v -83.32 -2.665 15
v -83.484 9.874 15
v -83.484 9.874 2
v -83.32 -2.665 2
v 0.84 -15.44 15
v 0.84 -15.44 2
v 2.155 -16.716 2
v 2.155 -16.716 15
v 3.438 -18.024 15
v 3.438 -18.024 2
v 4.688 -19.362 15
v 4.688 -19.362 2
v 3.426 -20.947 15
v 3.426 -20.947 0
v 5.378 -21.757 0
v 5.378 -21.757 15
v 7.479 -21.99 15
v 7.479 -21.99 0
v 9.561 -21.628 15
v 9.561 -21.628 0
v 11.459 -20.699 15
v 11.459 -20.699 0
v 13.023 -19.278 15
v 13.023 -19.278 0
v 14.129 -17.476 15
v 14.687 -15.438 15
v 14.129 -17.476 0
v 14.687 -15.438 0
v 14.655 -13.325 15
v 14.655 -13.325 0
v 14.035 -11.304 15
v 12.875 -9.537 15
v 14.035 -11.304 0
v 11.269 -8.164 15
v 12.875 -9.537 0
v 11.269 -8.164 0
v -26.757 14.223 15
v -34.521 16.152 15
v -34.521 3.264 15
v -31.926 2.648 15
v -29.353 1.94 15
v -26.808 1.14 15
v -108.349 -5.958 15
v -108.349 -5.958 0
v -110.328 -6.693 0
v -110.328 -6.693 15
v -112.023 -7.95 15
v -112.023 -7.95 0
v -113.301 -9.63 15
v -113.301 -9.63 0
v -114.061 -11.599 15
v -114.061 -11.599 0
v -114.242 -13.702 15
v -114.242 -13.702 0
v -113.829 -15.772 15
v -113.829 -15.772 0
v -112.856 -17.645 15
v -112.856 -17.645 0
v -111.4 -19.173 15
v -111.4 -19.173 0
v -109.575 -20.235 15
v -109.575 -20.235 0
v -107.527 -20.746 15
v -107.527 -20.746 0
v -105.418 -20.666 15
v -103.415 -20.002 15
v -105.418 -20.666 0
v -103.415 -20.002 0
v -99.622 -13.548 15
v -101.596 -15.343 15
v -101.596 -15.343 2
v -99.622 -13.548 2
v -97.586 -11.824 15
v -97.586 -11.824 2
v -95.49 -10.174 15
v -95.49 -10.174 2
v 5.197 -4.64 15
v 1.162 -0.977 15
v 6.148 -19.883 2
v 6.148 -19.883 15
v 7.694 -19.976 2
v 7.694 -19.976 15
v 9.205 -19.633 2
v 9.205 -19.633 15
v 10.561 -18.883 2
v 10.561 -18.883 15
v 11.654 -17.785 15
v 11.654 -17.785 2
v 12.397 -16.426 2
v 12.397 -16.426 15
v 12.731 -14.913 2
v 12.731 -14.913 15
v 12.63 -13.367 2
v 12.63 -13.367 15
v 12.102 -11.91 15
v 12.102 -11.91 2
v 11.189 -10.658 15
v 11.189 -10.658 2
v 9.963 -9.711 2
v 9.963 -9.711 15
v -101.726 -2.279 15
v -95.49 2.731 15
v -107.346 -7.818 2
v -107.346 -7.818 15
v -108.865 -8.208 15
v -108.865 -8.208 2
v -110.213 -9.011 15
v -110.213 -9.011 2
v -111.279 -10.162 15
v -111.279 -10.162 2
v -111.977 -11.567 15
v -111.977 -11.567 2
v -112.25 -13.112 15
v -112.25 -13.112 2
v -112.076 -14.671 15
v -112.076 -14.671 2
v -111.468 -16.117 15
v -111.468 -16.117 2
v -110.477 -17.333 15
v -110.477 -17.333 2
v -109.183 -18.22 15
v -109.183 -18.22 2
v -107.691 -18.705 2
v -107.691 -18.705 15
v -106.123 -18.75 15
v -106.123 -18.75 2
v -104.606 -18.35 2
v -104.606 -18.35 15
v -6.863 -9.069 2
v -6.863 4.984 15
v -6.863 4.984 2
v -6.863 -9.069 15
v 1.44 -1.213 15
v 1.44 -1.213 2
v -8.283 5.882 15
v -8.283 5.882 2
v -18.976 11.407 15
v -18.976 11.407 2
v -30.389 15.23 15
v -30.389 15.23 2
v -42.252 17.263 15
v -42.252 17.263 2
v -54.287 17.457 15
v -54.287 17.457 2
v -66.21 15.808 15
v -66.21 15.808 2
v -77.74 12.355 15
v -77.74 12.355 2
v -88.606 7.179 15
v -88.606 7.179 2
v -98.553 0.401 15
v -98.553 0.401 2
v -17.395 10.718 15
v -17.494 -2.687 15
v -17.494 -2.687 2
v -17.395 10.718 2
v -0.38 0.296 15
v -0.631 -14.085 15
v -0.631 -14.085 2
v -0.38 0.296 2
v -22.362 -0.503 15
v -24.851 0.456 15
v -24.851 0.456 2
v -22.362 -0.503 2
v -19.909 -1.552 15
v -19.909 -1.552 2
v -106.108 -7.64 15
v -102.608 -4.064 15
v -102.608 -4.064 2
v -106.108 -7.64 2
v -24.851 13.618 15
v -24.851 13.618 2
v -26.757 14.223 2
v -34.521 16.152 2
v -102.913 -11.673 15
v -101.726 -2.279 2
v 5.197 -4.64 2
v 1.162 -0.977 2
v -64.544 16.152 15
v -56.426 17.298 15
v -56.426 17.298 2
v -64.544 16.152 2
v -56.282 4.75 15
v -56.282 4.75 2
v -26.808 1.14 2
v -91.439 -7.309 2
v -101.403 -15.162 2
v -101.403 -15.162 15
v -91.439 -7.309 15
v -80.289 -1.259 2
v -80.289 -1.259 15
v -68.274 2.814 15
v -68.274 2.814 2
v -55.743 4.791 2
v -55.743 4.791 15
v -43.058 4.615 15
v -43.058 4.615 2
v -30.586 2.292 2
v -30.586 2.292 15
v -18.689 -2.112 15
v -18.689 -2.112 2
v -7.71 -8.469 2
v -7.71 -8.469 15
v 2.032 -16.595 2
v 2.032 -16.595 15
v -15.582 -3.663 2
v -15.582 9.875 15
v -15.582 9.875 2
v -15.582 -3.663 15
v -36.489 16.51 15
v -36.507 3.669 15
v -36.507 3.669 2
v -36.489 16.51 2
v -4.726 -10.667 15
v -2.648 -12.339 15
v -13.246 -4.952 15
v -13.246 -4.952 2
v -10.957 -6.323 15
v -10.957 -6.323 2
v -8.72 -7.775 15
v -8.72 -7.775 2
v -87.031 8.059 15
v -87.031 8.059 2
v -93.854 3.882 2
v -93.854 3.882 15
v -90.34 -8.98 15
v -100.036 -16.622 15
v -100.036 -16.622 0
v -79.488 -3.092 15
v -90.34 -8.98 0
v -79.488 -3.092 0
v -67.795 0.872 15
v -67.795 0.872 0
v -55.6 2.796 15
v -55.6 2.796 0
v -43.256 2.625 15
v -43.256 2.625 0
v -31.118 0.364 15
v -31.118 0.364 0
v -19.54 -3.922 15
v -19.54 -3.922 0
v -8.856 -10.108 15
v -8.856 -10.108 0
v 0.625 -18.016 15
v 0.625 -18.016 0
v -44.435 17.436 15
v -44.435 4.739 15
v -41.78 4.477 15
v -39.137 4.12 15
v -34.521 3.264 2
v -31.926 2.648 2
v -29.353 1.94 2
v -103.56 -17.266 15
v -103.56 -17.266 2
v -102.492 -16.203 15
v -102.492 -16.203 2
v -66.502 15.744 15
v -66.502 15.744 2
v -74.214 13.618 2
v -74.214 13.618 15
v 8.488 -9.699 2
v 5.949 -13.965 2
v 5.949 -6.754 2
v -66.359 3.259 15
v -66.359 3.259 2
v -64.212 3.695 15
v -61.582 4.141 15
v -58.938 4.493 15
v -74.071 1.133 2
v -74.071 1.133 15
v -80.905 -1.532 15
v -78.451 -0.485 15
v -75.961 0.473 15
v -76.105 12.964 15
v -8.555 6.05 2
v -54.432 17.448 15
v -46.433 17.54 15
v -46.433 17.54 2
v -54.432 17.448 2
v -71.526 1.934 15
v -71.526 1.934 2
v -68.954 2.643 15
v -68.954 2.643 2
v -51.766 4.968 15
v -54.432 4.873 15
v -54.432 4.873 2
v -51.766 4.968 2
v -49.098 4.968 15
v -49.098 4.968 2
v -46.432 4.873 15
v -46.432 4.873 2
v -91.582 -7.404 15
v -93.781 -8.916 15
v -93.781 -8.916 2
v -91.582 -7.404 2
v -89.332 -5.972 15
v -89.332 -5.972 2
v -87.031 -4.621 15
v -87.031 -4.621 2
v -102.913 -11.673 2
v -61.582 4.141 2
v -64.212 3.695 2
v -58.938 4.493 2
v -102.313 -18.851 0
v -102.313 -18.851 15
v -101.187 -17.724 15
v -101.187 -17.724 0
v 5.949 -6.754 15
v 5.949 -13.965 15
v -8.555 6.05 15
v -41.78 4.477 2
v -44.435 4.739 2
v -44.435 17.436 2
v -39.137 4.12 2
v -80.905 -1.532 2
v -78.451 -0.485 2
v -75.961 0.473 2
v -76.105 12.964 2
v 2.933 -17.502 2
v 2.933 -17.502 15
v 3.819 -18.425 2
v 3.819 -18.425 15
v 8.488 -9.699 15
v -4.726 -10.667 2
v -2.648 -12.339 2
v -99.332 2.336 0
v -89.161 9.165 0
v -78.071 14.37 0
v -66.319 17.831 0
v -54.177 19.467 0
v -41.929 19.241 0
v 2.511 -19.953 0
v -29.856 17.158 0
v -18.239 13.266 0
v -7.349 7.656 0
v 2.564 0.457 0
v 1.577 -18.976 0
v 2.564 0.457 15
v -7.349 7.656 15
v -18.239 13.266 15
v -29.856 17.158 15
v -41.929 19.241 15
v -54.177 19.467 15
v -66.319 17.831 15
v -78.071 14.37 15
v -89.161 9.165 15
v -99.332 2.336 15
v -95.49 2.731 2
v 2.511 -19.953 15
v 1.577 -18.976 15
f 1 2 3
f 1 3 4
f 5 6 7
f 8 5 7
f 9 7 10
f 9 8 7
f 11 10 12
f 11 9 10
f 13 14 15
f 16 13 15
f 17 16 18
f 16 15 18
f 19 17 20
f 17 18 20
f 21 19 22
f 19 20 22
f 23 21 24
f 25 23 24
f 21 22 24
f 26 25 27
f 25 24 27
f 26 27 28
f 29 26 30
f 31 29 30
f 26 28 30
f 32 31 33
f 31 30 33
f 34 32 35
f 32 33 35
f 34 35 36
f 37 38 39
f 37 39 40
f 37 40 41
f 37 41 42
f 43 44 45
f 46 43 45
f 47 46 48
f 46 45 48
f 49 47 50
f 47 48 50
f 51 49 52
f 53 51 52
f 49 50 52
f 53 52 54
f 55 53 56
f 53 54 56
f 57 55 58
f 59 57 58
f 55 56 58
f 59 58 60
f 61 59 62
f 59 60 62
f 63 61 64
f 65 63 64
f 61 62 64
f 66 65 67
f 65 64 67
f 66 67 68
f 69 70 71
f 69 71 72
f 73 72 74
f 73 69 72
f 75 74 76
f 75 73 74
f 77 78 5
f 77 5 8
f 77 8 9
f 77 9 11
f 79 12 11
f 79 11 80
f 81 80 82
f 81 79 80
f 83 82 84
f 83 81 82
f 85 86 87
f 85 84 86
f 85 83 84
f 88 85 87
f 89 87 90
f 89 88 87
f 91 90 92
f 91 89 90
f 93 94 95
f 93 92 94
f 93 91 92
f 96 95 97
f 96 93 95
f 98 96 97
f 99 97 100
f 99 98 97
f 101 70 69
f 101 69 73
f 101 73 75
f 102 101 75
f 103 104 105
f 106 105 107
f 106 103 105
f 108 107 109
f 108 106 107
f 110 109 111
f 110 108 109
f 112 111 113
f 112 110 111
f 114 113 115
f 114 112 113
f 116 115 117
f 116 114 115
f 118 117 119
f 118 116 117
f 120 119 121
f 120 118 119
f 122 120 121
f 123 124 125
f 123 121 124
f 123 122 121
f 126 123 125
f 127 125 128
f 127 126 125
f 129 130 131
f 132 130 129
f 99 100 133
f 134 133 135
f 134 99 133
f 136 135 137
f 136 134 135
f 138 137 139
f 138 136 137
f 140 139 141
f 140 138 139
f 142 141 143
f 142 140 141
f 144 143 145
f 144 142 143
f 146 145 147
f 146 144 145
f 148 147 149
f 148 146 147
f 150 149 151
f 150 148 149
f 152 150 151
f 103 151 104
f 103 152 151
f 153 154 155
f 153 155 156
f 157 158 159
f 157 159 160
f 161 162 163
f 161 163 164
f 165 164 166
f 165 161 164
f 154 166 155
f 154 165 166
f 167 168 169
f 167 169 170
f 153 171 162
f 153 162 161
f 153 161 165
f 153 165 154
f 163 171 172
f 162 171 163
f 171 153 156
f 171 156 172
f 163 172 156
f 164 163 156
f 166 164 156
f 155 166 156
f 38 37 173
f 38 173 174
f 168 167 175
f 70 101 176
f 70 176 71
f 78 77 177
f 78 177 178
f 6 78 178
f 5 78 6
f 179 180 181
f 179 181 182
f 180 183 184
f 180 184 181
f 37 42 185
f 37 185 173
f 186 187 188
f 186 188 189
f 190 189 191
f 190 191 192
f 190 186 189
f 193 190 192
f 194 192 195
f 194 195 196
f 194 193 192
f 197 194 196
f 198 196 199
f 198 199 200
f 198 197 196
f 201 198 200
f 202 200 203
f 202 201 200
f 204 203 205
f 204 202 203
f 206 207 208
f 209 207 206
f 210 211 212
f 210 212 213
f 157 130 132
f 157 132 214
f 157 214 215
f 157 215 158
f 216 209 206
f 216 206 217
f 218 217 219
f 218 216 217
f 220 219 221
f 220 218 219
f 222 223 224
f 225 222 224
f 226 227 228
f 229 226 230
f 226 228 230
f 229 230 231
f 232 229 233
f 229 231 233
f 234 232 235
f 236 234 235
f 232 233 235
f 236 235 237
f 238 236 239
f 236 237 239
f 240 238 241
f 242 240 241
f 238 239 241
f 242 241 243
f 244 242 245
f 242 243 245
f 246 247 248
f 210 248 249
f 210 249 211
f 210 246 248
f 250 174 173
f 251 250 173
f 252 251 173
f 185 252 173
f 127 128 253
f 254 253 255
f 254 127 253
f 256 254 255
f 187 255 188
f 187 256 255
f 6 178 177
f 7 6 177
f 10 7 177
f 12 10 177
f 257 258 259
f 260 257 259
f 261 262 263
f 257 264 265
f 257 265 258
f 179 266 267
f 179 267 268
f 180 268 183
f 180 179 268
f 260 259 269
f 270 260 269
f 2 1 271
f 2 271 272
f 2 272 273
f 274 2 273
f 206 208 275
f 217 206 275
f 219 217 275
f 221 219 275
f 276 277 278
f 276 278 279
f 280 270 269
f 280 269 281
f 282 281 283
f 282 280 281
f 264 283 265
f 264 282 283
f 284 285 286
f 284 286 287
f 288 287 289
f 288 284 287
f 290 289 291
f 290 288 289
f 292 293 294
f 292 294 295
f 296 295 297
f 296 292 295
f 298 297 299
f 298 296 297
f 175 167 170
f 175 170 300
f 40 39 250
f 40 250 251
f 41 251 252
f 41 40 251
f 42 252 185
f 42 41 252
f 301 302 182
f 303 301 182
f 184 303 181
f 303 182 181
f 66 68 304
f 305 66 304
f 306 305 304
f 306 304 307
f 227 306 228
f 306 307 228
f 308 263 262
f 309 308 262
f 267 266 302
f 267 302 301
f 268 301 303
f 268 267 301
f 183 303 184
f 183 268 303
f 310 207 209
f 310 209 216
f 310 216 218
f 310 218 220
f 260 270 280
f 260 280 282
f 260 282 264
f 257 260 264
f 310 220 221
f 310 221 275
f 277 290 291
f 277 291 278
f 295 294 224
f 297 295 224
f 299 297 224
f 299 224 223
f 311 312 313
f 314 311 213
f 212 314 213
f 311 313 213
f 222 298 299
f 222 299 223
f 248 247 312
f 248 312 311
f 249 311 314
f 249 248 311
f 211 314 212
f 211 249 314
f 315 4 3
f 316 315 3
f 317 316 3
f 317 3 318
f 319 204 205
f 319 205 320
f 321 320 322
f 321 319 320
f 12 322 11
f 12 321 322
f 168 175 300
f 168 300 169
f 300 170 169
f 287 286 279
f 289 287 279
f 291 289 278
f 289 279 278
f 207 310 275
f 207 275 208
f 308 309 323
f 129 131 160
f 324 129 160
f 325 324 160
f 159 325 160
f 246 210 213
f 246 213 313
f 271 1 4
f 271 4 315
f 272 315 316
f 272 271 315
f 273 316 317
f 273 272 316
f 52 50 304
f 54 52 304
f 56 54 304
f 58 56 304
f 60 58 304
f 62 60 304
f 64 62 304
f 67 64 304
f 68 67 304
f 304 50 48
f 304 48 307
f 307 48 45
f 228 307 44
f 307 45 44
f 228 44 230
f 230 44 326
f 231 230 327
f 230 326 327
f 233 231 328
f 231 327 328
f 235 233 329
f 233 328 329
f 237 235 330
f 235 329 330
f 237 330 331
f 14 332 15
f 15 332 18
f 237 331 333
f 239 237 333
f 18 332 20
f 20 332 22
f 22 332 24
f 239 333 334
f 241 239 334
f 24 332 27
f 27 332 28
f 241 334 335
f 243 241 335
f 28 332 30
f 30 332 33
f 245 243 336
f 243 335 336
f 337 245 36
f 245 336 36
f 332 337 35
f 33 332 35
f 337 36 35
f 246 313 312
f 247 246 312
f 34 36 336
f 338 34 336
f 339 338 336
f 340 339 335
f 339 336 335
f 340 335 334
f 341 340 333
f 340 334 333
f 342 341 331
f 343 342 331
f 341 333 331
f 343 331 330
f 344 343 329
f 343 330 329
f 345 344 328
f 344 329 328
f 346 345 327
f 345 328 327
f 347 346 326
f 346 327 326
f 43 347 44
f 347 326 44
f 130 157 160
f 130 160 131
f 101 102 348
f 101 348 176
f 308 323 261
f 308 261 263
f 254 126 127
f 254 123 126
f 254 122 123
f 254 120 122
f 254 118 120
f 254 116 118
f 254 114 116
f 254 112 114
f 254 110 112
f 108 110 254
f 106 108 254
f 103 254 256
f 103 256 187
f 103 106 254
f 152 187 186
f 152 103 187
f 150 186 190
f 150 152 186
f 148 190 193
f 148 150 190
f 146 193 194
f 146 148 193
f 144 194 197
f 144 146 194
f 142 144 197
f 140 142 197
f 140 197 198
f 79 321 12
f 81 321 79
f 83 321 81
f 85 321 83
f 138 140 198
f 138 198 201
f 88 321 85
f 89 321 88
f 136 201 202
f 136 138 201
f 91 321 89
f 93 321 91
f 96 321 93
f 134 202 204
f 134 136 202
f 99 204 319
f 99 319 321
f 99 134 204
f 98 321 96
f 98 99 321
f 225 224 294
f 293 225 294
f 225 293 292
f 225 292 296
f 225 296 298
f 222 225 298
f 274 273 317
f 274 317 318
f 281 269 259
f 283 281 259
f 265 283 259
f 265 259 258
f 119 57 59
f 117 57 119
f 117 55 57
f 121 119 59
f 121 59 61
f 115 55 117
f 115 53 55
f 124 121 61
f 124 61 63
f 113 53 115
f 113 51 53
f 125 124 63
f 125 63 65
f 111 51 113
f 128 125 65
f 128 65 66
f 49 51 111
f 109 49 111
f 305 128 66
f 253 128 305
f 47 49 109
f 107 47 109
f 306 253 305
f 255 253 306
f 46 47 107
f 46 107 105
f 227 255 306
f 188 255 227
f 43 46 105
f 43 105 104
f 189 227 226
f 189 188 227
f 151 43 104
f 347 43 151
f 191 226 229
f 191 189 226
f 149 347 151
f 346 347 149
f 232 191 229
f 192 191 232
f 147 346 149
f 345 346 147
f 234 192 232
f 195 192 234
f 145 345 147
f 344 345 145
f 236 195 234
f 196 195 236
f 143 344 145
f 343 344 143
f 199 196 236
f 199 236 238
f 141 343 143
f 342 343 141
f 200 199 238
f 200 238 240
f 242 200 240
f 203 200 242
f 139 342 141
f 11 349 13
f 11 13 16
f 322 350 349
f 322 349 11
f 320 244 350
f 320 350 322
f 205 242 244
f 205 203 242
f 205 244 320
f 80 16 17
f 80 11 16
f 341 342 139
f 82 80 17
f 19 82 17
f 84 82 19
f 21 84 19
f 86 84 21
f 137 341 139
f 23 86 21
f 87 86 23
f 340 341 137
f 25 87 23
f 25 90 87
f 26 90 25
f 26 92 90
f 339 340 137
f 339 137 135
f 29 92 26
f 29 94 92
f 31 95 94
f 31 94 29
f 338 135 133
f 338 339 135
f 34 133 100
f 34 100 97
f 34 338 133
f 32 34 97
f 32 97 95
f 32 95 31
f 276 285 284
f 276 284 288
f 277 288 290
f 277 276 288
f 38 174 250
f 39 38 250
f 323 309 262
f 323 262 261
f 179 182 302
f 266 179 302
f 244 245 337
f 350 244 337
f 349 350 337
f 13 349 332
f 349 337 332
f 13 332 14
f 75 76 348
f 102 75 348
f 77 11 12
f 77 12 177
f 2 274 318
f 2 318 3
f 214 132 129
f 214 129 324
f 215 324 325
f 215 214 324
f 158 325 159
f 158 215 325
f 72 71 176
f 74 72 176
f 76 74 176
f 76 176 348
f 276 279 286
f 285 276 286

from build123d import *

# Parameters (mm, degrees)
F1_DEPTH = 15
F2_T     = -2
F4_DEPTH = 13


with BuildPart() as f1:
    # F0 (on Top) → F1 (new body)
    with BuildSketch(Plane.XY):
        with BuildLine():
            ThreePointArc((-103.4145893394, -20.0020372304), (-101.7530636303, -18.2842545923), (-100.0358769395, -16.622112979))
            ThreePointArc((-100.0358769395, -16.622112979), (-100.8380156497, -8.6749521659), (-108.3492203393, -5.9578589379))
            ThreePointArc((-108.3492203393, -5.9578589379), (-113.8289881657, -15.7722740518), (-103.4145893394, -20.0020372304))
        make_face()
        with BuildLine():
            ThreePointArc((-108.3492203393, -5.9578589379), (-100.8380156497, -8.6749521659), (-100.0358769395, -16.622112979))
            ThreePointArc((-100.0358769395, -16.622112979), (-49.4242809896, 2.9732946618), (0.62536283, -18.0159120585))
            ThreePointArc((0.62536283, -18.0159120585), (2.1522005977, -8.98989439), (11.2690780996, -8.1635935155))
            ThreePointArc((11.2690780996, -8.1635935155), (-48.0486807446, 19.5876661754), (-108.3492203393, -5.9578589379))
        make_face()
        with BuildLine():
            ThreePointArc((11.2690780996, -8.1635935155), (2.1522005977, -8.98989439), (0.62536283, -18.0159120585))
            ThreePointArc((0.62536283, -18.0159120585), (2.0460375935, -19.4621178326), (3.4257617252, -20.9474424588))
            ThreePointArc((3.4257617252, -20.9474424588), (13.6396472431, -18.4160086635), (11.2690780996, -8.1635935155))
        make_face()
    extrude(amount=F1_DEPTH)

    # F2
    f2_openings = [f1.faces().sort_by_distance(p)[0] for p in [
        (-49.774898, 4.332759, 15),
    ]]
    offset(amount=F2_T, openings=f2_openings, kind=Kind.INTERSECTION)


with BuildPart() as f4:
    # F3 (on face) → F4 (new body, through all)
    with BuildSketch(Plane.XY.offset(15)):
        with BuildLine():
            Line((-95.4898901075, -10.1742005895), (-95.4898901075, 2.7314309094))
            Line((-95.4898901075, 2.7314309094), (-101.7262580431, -2.2793290103))
            Line((-101.7262580431, -2.2793290103), (-101.5956101166, -15.3433575005))
            ThreePointArc((-101.5956101166, -15.3433575005), (-98.6121194375, -12.6768411805), (-95.4898901075, -10.1742005895))
        make_face()
    extrude(amount=-F4_DEPTH)


with BuildPart() as f4b:
    # F3 (on face) → F4, piece 2 (new body, through all)
    with BuildSketch(Plane.XY.offset(15)):
        with BuildLine():
            Line((-87.0312413723, -4.6207937288), (-87.0312413723, 8.0593059238))
            Line((-87.0312413723, 8.0593059238), (-93.8541566424, 3.882246286))
            Line((-93.8541566424, 3.882246286), (-93.7805583698, -8.9157582301))
            ThreePointArc((-93.7805583698, -8.9157582301), (-90.463537663, -6.677701138), (-87.0312413723, -4.6207937288))
        make_face()
    extrude(amount=-F4_DEPTH)


with BuildPart() as f4c:
    # F3 (on face) → F4, piece 3 (new body, through all)
    with BuildSketch(Plane.XY.offset(15)):
        with BuildLine():
            Line((-75.9613002437, 0.4730007029), (-76.1046711734, 12.9642358404))
            Line((-76.1046711734, 12.9642358404), (-83.4838928856, 9.8743997731))
            Line((-83.4838928856, 9.8743997731), (-83.3200044003, -2.6653863247))
            ThreePointArc((-83.3200044003, -2.6653863247), (-79.6827690143, -0.9974400834), (-75.9613002437, 0.4730007029))
        make_face()
    extrude(amount=-F4_DEPTH)


with BuildPart() as f4d:
    # F3 (on face) → F4, piece 4 (new body, through all)
    with BuildSketch(Plane.XY.offset(15)):
        with BuildLine():
            Line((-66.3586949755, 3.258935501), (-66.5021755213, 15.7439962339))
            Line((-66.5021755213, 15.7439962339), (-74.2144002054, 13.6175930684))
            Line((-74.2144002054, 13.6175930684), (-74.0711079848, 1.1332154879))
            ThreePointArc((-74.0711079848, 1.1332154879), (-70.24342833, 2.2995749427), (-66.3586949755, 3.258935501))
        make_face()
    extrude(amount=-F4_DEPTH)


with BuildPart() as f4e:
    # F3 (on face) → F4, piece 5 (new body, through all)
    with BuildSketch(Plane.XY.offset(15)):
        with BuildLine():
            Line((-56.2822685579, 4.7501755422), (-56.4264683123, 17.2978187198))
            Line((-56.4264683123, 17.2978187198), (-64.5441680089, 16.1516806479))
            Line((-64.5441680089, 16.1516806479), (-64.2124202231, 3.6953321573))
            ThreePointArc((-64.2124202231, 3.6953321573), (-60.2615002336, 4.3291753187), (-56.2822685579, 4.7501755422))
        make_face()
    extrude(amount=-F4_DEPTH)


with BuildPart() as f4f:
    # F3 (on face) → F4, piece 6 (new body, through all)
    with BuildSketch(Plane.XY.offset(15)):
        with BuildLine():
            Line((-46.4326556534, 17.5400977585), (-54.4321274251, 17.4481664014))
            Line((-54.4321274251, 17.4481664014), (-54.4321274251, 4.8727246799))
            ThreePointArc((-54.4321274251, 4.8727246799), (-50.4321319055, 4.980250305), (-46.432127432, 4.8730582835))
            Line((-46.432127432, 4.8730582835), (-46.4326556534, 17.5400977585))
        make_face()
    extrude(amount=-F4_DEPTH)


with BuildPart() as f4g:
    # F3 (on face) → F4, piece 7 (new body, through all)
    with BuildSketch(Plane.XY.offset(15)):
        with BuildLine():
            Line((-36.4891635139, 16.5095859122), (-44.435386294, 17.4356223741))
            Line((-44.435386294, 17.4356223741), (-44.435386294, 4.7389883998))
            ThreePointArc((-44.435386294, 4.7389883999), (-40.4569568247, 4.3104736687), (-36.5072409706, 3.6691698492))
            Line((-36.5072409706, 3.6691698492), (-36.4891635139, 16.5095859122))
        make_face()
    extrude(amount=-F4_DEPTH)


with BuildPart() as f4h:
    # F3 (on face) → F4, piece 8 (new body, through all)
    with BuildSketch(Plane.XY.offset(15)):
        with BuildLine():
            Line((-26.7574328685, 14.223014409), (-34.5213930336, 16.1519837075))
            Line((-34.5213930336, 16.1519837075), (-34.5213930336, 3.2637521859))
            ThreePointArc((-34.5213930336, 3.2637521859), (-30.6363695723, 2.3055671189), (-26.8083371744, 1.1403659015))
            Line((-26.8083371744, 1.1403659014), (-26.7574328685, 14.223014409))
        make_face()
    extrude(amount=-F4_DEPTH)


with BuildPart() as f4i:
    # F3 (on face) → F4, piece 9 (new body, through all)
    with BuildSketch(Plane.XY.offset(15)):
        with BuildLine():
            Line((-17.3954665655, 10.7175076645), (-24.8511096793, 13.6180913574))
            Line((-24.8511096793, 13.6180913574), (-24.8511096793, 0.4563537047))
            ThreePointArc((-24.8511096793, 0.4563537047), (-21.1305995668, -1.0165109937), (-17.4944514793, -2.6868262342))
            Line((-17.4944514793, -2.6868262343), (-17.3954665655, 10.7175076645))
        make_face()
    extrude(amount=-F4_DEPTH)


with BuildPart() as f4j:
    # F3 (on face) → F4, piece 10 (new body, through all)
    with BuildSketch(Plane.XY.offset(15)):
        with BuildLine():
            Line((-8.5552640176, 6.0499805347), (-15.581541431, 9.8750852013))
            Line((-15.581541431, 9.8750852013), (-15.581541431, -3.6629684785))
            ThreePointArc((-15.581541431, -3.6629684785), (-12.0953403549, -5.6271293615), (-8.7195174744, -7.775464949))
            Line((-8.7195174744, -7.775464949), (-8.5552640176, 6.0499805347))
        make_face()
    extrude(amount=-F4_DEPTH)


with BuildPart() as f4k:
    # F3 (on face) → F4, piece 11 (new body, through all)
    with BuildSketch(Plane.XY.offset(15)):
        with BuildLine():
            Line((-0.3803533632, 0.2962142563), (-6.863187541, 4.9837360987))
            Line((-6.863187541, 4.9837360987), (-6.863187541, -9.0694472612))
            ThreePointArc((-6.863187541, -9.0694472612), (-3.6795459884, -11.4934836433), (-0.6305151118, -14.08480312))
            Line((-0.6305151118, -14.08480312), (-0.3803533632, 0.2962142563))
        make_face()
    extrude(amount=-F4_DEPTH)


with BuildPart() as f4l:
    # F3 (on face) → F4, piece 12 (new body, through all)
    with BuildSketch(Plane.XY.offset(15)):
        with BuildLine():
            Line((5.1970376847, -4.6404480133), (1.1624021679, -0.9765407756))
            Line((1.1624021679, -0.9765407756), (0.8401080904, -15.4402614916))
            ThreePointArc((0.8401080904, -15.4402614916), (2.8002896228, -17.3658881786), (4.6881961793, -19.3624248329))
            Line((4.6881961792, -19.3624248328), (5.1970376847, -4.6404480133))
        make_face()
    extrude(amount=-F4_DEPTH)


with BuildPart() as f4m:
    # F3 (on face) → F4, piece 13 (new body, through all)
    with BuildSketch(Plane.XY.offset(15)):
        Polygon((8.4884027019, -9.6990149468), (5.9492685832, -6.7536202259), (5.9492685832, -13.9647591859), align=None)
    extrude(amount=-F4_DEPTH)


with BuildPart() as f4n:
    # F3 (on face) → F4, piece 14 (new body, through all)
    with BuildSketch(Plane.XY.offset(15)):
        Polygon((-102.9125899076, -11.6728357971), (-102.6082411408, -4.0640323423), (-106.1082854867, -7.6401694678), align=None)
    extrude(amount=-F4_DEPTH)


solid = Compound([f1.part, f4.part, f4b.part, f4c.part, f4d.part, f4e.part, f4f.part, f4g.part, f4h.part, f4i.part, f4j.part, f4k.part, f4l.part, f4m.part, f4n.part])
